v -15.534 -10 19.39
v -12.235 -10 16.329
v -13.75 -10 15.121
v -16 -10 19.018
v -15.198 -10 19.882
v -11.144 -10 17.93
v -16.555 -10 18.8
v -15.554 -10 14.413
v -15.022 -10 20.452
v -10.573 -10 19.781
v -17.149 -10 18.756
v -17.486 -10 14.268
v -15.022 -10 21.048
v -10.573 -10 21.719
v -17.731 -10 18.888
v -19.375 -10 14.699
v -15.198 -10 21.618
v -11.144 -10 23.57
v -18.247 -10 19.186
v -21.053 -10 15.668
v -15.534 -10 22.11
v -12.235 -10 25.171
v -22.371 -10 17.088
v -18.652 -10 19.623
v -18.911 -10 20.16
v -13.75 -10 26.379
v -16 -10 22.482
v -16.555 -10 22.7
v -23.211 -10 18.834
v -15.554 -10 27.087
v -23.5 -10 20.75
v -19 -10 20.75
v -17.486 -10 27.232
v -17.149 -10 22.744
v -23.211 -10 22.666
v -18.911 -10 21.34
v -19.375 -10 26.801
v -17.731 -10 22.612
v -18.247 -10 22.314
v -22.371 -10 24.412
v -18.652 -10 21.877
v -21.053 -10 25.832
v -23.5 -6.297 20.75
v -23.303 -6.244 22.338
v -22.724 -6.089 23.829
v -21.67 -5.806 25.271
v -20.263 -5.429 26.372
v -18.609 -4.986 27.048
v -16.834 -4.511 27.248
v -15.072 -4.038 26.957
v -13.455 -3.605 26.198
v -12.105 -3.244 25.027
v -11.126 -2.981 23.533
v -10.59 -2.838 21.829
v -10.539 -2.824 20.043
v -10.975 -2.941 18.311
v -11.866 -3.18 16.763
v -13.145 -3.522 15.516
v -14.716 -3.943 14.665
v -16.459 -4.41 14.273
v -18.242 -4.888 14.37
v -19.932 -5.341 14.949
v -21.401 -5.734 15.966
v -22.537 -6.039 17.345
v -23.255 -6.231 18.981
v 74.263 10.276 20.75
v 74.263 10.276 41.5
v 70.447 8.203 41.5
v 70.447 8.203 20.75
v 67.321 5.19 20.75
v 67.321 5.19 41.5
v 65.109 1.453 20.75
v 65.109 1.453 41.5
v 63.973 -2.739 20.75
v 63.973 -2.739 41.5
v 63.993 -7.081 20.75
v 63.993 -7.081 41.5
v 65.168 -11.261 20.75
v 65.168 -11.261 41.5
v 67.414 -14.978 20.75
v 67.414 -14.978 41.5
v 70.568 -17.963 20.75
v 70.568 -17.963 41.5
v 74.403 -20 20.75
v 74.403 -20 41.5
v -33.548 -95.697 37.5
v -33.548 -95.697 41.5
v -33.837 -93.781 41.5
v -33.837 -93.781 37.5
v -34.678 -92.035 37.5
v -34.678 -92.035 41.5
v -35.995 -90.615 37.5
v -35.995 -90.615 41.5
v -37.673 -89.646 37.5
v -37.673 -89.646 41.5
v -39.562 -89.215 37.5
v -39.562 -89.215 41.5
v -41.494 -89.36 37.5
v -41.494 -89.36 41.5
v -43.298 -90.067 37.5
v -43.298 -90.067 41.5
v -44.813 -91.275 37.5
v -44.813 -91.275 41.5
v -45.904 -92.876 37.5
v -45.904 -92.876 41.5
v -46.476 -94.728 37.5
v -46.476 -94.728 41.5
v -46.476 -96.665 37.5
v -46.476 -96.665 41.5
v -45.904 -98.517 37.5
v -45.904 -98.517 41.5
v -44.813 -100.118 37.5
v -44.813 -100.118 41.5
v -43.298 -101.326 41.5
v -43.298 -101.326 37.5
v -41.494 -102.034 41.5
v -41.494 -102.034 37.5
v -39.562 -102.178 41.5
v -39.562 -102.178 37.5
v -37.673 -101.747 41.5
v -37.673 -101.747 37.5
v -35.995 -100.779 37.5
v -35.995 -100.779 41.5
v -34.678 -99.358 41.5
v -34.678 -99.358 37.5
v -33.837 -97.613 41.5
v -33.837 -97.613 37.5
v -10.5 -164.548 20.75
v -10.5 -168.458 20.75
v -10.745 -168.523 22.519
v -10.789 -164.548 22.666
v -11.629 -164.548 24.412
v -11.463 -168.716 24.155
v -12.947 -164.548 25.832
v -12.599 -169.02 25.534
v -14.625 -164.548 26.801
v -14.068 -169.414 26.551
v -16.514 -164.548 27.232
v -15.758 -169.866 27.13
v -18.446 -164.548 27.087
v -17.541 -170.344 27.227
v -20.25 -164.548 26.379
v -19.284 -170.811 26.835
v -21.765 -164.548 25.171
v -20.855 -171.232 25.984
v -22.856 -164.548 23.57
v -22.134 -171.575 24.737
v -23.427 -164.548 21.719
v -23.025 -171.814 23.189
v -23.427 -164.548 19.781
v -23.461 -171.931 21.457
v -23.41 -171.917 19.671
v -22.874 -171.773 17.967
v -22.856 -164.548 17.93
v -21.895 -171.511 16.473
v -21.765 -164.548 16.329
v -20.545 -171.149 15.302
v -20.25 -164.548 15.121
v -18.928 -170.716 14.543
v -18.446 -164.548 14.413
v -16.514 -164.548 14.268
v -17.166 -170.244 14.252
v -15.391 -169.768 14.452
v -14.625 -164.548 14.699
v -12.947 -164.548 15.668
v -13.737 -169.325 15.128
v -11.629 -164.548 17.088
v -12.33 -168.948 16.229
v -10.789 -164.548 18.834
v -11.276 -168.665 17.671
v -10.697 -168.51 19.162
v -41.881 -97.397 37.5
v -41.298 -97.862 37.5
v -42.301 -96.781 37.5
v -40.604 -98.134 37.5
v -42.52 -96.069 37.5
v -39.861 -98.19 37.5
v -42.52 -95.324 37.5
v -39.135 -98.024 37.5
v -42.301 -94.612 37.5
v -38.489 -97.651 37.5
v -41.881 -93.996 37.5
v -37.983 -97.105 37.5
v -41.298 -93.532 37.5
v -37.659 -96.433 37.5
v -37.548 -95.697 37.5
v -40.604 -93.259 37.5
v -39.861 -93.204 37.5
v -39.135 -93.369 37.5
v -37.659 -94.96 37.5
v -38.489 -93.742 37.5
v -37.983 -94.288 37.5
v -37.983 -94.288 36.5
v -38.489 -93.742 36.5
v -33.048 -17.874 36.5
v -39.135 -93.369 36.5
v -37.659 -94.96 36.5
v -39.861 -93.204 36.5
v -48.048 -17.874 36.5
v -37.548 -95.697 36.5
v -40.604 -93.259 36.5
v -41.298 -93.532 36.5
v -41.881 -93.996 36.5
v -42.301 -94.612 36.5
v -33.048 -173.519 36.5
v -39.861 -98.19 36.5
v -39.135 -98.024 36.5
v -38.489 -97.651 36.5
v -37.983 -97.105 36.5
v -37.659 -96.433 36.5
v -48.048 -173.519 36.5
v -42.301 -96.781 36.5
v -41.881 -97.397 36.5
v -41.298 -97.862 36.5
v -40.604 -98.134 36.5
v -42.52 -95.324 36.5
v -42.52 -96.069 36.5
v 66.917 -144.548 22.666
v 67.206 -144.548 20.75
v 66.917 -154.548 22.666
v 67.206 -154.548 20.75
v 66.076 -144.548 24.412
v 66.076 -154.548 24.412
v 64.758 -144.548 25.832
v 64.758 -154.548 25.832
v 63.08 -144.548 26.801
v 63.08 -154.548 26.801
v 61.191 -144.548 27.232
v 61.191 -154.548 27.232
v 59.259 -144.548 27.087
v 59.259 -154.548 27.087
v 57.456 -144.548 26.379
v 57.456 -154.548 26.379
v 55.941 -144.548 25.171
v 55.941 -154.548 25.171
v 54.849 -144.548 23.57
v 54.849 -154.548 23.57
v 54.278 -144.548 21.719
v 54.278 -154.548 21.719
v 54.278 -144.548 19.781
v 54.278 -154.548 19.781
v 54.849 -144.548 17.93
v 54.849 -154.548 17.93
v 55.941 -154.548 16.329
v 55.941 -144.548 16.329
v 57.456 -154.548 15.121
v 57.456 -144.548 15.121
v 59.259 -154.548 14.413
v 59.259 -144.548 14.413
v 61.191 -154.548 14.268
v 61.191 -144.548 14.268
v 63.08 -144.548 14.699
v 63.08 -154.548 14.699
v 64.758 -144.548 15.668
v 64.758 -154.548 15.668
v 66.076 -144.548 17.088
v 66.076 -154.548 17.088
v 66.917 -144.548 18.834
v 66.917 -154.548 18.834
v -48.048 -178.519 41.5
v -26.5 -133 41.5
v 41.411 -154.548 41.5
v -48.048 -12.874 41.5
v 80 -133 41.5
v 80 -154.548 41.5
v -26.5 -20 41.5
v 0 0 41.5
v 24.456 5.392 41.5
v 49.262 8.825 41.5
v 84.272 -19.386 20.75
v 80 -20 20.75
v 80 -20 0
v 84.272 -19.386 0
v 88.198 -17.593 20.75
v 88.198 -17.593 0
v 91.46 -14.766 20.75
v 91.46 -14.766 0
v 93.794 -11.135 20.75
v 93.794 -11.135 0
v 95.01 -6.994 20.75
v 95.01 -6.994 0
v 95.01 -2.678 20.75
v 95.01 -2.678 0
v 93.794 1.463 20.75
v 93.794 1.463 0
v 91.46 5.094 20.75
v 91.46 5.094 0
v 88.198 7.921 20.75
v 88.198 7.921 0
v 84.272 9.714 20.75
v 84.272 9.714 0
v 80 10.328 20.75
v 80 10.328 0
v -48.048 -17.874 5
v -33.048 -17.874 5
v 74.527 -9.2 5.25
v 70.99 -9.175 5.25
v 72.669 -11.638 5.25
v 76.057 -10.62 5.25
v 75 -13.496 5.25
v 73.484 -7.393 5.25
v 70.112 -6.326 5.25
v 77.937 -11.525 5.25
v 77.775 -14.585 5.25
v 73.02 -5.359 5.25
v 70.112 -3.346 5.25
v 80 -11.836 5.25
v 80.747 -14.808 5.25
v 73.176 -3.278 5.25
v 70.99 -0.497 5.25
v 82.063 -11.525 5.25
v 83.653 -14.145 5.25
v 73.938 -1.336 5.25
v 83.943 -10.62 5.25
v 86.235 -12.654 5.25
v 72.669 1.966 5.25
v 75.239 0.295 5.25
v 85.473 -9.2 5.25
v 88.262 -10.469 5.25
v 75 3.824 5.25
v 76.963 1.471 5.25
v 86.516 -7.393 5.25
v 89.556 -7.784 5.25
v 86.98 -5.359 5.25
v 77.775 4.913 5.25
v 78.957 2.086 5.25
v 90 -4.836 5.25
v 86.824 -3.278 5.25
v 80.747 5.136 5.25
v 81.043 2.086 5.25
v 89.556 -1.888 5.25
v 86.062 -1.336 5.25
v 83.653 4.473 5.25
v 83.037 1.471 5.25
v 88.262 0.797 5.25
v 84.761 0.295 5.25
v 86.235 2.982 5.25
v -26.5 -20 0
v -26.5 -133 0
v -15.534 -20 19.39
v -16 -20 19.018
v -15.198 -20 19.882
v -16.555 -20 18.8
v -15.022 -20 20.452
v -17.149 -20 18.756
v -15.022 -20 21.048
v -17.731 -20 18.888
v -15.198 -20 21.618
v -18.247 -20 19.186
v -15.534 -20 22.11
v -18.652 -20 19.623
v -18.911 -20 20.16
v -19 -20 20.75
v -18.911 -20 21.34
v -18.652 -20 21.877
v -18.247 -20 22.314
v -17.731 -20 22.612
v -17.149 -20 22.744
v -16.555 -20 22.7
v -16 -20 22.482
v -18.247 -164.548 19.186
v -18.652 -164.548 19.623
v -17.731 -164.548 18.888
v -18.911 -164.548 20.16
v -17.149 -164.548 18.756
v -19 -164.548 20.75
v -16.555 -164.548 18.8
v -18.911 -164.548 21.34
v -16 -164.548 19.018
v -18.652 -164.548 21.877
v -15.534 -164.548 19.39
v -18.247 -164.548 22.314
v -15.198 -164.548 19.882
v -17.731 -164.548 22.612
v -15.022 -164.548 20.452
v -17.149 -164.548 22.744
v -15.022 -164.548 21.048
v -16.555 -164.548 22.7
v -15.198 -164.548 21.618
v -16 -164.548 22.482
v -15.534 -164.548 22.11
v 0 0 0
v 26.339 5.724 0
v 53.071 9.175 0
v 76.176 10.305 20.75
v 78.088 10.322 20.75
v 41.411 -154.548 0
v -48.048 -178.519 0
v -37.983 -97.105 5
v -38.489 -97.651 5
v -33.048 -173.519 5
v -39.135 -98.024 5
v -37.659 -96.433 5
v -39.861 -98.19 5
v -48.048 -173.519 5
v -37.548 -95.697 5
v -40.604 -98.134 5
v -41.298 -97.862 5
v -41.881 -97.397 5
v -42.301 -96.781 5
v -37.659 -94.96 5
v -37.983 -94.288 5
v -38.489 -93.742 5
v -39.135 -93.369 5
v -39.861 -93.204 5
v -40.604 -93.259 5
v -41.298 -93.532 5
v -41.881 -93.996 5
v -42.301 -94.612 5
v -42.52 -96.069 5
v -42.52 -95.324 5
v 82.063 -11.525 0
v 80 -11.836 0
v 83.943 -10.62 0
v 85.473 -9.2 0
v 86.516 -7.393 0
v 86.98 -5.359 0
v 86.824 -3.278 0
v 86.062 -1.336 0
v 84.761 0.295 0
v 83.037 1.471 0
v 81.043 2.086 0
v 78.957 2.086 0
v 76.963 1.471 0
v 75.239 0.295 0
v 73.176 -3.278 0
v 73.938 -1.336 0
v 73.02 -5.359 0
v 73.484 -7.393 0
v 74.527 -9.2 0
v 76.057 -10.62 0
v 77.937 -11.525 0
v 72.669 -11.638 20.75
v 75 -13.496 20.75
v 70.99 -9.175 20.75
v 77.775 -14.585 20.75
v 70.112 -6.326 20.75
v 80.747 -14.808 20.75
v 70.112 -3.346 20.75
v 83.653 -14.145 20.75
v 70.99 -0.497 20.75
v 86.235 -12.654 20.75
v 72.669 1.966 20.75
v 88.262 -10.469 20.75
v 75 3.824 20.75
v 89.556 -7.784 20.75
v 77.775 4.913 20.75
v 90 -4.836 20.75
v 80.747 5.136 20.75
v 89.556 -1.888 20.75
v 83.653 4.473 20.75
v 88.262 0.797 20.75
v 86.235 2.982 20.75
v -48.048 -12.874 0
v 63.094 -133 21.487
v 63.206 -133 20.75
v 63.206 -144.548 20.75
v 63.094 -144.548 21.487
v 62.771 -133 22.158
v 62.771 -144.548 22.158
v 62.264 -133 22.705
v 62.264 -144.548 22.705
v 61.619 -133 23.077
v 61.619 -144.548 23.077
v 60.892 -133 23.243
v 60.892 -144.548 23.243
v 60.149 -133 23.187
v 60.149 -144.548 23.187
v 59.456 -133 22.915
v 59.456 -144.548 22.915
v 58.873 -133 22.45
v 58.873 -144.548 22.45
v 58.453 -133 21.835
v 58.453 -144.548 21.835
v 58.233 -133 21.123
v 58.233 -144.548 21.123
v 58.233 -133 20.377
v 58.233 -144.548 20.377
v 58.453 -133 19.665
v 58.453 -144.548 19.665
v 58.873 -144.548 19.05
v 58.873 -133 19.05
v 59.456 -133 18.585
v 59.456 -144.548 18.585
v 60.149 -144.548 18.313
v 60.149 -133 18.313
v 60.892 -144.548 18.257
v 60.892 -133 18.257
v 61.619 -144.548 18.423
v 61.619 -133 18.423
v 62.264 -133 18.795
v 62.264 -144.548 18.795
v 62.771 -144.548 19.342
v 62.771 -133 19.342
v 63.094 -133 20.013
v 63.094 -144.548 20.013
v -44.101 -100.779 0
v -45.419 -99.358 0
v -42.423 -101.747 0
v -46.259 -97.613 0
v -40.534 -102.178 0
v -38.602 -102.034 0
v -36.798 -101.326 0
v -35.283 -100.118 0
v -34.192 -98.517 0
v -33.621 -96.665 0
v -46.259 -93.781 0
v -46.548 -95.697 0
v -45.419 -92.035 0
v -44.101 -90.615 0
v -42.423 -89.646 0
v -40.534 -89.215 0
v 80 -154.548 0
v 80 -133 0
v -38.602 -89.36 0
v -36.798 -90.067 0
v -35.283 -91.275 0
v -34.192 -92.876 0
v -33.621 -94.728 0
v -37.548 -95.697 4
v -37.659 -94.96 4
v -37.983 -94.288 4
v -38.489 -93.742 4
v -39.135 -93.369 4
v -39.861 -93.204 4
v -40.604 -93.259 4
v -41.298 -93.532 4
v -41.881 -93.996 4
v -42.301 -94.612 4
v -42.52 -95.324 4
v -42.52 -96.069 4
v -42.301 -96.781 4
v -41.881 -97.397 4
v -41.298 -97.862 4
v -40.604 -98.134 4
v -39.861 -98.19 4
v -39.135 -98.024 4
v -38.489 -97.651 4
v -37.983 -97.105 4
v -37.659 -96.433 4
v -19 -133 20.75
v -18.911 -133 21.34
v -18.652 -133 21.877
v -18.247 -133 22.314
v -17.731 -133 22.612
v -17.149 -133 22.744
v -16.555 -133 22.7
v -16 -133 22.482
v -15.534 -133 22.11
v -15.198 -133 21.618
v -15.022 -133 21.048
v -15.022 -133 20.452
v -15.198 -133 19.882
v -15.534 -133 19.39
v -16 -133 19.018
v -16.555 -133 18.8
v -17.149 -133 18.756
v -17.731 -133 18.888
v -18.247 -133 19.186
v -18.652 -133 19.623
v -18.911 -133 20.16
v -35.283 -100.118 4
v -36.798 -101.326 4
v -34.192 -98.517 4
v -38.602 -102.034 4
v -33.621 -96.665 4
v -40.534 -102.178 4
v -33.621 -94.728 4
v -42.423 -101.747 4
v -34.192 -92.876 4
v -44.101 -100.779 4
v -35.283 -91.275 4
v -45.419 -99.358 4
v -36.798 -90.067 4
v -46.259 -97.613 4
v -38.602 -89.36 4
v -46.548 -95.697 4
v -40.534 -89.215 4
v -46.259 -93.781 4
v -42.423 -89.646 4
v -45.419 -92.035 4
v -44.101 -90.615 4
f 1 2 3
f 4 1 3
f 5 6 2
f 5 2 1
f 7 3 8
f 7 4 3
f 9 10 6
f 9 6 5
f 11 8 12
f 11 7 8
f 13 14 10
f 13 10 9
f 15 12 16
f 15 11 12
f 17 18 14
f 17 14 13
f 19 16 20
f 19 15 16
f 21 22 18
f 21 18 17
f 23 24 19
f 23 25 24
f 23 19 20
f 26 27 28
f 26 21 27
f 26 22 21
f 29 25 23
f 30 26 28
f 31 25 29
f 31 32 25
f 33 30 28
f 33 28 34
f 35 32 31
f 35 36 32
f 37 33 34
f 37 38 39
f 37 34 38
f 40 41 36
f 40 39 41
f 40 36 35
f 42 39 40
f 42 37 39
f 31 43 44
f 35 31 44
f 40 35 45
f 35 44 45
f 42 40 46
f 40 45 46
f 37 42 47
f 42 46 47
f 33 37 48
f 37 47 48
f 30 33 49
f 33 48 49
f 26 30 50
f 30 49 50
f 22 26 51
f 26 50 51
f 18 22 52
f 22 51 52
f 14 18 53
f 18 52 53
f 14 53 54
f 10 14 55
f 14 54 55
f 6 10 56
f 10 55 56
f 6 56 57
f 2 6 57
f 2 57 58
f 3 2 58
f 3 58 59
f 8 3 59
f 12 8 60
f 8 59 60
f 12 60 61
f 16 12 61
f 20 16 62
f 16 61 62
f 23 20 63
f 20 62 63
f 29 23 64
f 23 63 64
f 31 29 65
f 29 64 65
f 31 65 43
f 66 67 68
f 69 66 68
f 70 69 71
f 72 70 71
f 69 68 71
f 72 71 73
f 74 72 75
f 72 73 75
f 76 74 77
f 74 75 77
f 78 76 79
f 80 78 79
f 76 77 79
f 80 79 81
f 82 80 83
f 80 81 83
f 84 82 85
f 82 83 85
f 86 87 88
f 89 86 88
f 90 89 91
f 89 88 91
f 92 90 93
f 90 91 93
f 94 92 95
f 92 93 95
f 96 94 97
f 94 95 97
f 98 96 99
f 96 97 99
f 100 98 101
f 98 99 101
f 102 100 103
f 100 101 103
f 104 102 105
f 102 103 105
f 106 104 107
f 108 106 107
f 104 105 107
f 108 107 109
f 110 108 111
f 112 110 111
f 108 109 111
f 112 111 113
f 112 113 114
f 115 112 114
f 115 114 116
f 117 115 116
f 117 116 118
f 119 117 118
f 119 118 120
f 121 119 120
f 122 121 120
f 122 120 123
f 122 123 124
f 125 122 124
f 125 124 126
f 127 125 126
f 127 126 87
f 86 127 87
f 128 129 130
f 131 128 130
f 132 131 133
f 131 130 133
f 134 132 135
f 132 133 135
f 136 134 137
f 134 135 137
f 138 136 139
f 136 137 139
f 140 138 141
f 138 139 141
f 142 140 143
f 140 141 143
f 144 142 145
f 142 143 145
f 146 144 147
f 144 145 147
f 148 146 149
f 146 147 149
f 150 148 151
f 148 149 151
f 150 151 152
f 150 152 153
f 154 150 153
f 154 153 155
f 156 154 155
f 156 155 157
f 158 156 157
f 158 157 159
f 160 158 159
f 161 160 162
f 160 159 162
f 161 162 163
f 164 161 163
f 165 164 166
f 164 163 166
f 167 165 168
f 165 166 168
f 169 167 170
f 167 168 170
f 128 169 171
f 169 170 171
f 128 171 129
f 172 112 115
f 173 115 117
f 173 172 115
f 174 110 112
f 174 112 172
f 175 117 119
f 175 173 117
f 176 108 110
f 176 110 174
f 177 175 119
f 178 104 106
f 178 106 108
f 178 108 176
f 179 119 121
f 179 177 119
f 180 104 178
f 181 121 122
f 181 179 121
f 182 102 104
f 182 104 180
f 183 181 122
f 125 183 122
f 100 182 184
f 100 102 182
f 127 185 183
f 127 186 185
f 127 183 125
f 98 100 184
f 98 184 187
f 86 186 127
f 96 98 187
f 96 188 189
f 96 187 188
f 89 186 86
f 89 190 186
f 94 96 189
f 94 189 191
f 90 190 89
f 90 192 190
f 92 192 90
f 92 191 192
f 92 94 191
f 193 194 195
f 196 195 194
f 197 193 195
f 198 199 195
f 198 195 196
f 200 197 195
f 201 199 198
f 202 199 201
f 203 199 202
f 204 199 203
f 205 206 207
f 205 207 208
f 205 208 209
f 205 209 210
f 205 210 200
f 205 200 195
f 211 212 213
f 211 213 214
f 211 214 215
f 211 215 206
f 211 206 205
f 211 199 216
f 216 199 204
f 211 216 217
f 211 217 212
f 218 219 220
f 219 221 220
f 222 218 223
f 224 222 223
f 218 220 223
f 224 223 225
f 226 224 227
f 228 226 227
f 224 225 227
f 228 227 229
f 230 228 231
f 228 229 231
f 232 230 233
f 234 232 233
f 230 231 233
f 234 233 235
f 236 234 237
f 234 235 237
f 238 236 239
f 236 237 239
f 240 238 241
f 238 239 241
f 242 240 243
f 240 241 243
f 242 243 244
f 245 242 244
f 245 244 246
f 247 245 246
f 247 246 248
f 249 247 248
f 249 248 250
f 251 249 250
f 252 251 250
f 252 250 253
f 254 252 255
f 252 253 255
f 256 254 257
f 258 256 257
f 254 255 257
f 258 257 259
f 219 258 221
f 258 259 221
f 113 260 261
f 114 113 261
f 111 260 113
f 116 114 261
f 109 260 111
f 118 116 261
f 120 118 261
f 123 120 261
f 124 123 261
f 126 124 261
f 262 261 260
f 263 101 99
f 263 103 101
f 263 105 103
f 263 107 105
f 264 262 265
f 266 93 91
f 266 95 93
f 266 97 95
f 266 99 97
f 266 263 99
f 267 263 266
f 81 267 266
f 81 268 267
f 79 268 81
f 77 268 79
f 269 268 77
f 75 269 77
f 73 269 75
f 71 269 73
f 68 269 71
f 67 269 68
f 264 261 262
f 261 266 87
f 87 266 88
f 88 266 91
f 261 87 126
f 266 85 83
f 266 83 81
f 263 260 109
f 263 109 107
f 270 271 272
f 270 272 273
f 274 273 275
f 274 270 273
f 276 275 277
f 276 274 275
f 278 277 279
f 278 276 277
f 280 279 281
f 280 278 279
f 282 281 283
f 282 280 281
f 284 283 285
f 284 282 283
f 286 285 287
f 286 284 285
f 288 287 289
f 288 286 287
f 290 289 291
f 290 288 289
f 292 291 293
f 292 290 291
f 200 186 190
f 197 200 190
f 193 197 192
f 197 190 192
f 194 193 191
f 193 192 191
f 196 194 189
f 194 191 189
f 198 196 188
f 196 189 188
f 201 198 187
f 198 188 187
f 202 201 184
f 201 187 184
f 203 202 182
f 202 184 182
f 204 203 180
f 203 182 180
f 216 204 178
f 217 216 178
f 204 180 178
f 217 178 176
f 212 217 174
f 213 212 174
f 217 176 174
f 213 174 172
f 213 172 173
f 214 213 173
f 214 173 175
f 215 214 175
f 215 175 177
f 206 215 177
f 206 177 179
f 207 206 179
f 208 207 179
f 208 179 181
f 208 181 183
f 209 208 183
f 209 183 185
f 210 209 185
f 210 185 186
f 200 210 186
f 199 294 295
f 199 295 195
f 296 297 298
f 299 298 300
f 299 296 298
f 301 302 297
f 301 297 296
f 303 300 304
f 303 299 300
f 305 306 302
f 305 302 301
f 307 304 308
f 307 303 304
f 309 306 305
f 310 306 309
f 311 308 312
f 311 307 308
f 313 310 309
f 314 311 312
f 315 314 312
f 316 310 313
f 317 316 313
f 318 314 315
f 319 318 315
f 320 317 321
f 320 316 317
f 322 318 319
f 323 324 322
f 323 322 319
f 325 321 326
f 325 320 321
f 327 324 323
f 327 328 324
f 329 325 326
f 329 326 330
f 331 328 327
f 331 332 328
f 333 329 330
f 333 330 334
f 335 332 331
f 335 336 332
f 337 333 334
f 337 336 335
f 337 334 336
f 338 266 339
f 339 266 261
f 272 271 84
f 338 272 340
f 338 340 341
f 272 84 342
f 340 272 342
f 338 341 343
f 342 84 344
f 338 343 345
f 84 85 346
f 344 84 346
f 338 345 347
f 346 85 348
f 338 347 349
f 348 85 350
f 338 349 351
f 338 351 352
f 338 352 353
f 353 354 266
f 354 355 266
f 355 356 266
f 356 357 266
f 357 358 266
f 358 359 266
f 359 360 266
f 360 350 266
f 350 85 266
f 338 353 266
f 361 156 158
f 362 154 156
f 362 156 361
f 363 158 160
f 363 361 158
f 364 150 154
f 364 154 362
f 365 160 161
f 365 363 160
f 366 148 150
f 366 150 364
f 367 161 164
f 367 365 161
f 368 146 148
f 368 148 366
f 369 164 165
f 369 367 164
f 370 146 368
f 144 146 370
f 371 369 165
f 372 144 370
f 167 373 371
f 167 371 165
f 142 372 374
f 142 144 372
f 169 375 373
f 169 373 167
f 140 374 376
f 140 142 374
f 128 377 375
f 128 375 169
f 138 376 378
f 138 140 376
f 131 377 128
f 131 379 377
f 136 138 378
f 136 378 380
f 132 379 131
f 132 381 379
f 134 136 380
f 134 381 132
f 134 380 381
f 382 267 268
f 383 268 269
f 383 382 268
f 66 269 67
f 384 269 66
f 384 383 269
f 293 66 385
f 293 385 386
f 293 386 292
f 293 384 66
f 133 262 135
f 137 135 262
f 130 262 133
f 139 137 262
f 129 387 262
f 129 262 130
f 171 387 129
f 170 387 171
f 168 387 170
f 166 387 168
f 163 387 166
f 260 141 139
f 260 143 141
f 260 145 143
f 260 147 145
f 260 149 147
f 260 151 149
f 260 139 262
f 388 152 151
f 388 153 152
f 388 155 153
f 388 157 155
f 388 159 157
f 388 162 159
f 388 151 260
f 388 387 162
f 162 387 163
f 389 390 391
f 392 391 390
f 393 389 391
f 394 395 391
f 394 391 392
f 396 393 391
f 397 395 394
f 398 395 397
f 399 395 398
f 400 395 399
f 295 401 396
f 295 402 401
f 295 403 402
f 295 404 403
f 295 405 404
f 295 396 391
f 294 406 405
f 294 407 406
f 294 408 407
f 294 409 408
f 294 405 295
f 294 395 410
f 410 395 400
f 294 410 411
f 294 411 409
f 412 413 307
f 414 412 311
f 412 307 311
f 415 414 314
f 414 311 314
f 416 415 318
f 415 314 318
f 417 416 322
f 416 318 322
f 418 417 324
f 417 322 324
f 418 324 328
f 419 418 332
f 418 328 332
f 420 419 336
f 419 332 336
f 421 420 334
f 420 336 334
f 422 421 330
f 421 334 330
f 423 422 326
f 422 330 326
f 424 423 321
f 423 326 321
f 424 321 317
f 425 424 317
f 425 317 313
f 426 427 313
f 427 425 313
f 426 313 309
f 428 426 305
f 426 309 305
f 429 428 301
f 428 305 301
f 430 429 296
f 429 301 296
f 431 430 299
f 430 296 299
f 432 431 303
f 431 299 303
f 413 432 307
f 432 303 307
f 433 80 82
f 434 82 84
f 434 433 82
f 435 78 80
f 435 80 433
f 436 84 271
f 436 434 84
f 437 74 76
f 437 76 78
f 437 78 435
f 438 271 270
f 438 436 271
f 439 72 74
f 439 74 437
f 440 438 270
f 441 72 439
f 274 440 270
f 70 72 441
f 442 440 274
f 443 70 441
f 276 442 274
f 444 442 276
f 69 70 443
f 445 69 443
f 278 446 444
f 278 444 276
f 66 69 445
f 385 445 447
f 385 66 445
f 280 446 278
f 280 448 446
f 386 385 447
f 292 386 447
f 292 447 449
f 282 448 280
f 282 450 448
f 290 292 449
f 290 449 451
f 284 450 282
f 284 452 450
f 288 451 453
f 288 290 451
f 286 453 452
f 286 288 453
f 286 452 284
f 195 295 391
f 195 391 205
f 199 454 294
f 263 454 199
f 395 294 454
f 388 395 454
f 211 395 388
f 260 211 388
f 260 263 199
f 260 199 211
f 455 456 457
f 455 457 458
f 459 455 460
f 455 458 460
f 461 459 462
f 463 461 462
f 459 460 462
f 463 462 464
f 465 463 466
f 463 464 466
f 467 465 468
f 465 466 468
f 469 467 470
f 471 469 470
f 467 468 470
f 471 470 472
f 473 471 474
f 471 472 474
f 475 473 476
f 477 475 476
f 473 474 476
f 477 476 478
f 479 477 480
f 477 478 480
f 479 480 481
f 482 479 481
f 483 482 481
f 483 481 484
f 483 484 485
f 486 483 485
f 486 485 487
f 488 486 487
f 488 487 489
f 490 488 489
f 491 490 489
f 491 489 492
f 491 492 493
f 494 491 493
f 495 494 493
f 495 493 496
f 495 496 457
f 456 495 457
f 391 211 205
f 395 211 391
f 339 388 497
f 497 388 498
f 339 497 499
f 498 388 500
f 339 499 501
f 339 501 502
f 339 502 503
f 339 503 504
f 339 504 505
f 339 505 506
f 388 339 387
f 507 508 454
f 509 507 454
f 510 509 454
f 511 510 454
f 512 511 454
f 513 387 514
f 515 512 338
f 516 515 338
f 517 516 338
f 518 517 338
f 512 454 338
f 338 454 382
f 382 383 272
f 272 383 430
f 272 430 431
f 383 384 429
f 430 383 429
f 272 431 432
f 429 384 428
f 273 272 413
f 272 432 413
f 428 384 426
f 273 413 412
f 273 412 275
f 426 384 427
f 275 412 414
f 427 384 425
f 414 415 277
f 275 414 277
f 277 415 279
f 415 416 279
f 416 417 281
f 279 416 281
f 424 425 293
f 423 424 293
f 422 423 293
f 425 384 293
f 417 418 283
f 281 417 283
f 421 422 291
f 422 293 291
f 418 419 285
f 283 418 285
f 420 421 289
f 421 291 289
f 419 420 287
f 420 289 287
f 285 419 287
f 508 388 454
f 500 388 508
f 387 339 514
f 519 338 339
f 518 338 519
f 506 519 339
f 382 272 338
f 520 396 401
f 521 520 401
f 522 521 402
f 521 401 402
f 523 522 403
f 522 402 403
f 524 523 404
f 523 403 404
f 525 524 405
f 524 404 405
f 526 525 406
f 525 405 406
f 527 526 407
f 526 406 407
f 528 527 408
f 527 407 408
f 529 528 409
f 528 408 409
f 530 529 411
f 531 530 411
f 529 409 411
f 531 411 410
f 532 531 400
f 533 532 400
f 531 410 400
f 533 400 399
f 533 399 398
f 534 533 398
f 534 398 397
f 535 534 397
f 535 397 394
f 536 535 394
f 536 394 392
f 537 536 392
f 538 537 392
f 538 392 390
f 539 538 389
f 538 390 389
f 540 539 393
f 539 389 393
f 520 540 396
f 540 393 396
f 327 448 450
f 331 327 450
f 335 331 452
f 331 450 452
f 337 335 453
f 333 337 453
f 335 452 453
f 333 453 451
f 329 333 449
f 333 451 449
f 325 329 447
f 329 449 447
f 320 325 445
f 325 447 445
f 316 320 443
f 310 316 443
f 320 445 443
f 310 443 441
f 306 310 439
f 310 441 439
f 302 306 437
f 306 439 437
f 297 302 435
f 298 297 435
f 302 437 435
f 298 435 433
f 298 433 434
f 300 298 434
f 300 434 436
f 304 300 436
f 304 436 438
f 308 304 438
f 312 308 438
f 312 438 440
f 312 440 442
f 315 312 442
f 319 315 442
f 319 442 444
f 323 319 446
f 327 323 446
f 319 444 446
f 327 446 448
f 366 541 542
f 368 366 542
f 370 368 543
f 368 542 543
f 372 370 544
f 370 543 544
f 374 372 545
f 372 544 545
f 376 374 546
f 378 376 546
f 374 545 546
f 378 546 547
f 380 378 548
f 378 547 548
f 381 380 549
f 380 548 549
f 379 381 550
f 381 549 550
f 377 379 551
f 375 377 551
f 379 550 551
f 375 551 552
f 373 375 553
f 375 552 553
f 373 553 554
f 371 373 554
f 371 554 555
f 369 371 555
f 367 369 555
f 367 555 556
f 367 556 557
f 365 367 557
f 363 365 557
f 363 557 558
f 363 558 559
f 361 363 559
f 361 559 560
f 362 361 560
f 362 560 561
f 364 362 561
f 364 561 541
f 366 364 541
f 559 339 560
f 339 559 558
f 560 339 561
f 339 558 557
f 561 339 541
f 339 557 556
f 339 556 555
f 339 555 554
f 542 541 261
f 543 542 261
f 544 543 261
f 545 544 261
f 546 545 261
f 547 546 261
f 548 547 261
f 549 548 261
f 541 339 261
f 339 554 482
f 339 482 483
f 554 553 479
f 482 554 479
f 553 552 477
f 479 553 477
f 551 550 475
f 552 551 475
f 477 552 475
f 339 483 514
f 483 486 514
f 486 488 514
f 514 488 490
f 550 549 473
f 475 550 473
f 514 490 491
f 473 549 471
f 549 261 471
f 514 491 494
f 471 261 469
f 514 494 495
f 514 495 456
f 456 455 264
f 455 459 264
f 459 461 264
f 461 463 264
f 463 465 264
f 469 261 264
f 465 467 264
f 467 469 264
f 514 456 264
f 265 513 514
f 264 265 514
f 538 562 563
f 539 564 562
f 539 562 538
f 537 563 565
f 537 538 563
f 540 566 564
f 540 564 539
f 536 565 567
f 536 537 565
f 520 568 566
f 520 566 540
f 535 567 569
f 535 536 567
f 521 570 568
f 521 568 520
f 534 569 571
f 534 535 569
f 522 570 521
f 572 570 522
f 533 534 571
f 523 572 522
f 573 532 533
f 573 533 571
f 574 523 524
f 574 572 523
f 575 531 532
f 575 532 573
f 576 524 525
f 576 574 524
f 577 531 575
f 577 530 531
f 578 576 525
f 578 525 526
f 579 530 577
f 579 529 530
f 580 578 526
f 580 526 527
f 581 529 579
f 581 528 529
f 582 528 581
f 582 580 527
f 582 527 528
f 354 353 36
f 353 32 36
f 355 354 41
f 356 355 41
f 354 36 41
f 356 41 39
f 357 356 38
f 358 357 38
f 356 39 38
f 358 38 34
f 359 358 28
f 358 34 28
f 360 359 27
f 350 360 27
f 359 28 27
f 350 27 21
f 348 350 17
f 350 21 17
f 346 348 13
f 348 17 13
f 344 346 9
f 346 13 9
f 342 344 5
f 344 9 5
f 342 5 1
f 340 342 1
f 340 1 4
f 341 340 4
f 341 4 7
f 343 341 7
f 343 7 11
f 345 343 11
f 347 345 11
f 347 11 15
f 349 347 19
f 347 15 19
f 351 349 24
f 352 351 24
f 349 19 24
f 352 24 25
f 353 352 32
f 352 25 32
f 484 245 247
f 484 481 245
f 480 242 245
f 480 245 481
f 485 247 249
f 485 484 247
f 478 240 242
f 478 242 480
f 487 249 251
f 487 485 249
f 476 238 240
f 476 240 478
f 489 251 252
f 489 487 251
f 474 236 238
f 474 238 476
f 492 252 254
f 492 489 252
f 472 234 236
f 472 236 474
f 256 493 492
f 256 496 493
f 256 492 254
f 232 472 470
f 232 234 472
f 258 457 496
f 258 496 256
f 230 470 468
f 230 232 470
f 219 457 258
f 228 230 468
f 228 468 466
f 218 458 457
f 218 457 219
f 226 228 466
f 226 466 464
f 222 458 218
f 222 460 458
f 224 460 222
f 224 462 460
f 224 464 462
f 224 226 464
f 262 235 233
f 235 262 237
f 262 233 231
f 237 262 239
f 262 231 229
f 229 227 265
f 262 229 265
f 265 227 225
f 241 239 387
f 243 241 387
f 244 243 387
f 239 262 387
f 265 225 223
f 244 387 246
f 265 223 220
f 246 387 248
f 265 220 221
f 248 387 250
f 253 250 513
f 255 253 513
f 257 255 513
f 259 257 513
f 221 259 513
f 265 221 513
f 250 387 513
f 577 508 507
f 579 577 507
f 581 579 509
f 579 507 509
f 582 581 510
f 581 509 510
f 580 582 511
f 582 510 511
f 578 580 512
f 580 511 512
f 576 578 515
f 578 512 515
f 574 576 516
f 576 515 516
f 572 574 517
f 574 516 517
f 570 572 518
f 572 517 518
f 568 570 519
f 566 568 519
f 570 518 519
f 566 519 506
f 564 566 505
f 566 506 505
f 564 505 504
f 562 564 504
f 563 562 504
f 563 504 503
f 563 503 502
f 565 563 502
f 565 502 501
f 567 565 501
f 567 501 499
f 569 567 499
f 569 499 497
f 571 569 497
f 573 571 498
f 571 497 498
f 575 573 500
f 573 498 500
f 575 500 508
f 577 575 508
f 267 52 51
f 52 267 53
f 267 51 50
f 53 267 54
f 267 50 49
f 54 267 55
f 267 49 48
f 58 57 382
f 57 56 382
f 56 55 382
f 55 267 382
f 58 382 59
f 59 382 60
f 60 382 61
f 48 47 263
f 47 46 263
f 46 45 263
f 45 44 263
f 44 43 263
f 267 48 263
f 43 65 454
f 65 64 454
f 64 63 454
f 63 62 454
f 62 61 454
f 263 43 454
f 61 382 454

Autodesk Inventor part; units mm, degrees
ref_plane "YZ Plane" through (0, 0, 0) normal (1, 0, 0) x (0, 1, 0)
ref_plane "XZ Plane" through (0, 0, 0) normal (0, 1, 0) x (-1, 0, 0)
sketch "Sketch1" plane through (0, 0, 0) normal (0, 0, 1) x (1, 0, 0)
  line L0 (0, 0) -> (160, 0) construction
  line L1 (160, 0) -> (118.589, -154.5481) construction
  line L2 (0, 0) -> (41.411, -154.5481) construction
  line L3 (41.411, -154.5481) -> (118.589, -154.5481)
  circle A0 centre (235.8871, -103.156) radius 80 construction
  line L4 (160, 0) -> (256.5926, -25.8819)
  line L5 (118.589, -154.5481) -> (215.1815, -180.43)
  arc A1 (215.1815, -180.43) -> (256.5926, -25.8819) centre (235.8871, -103.156) ccw
  circle A2 centre (-75.8871, -103.156) radius 80 construction
  line L6 (0, 0) -> (-96.5926, -25.8819)
  line L7 (41.411, -154.5481) -> (-55.1815, -180.43)
  arc A3 (-96.5926, -25.8819) -> (-55.1815, -180.43) centre (-75.8871, -103.156) ccw
  arc A4 (160, 0) -> (0, 0) centre (80, -304.672) ccw
  dimension "d0" = 160
  dimension "d1" = 160
  dimension "d2" = 160
  dimension "d3" = 75
  dimension "d4" = 75
  dimension "d5" = 160
  dimension "d6" = 100
  dimension "d7" = 160
  dimension "d9" = 100
  dimension "d56" = 315
extrude "Extrusion1" add sketch "Sketch1" along normal blind 41.5
sketch "Sketch2" plane through (0, 0, 41.5) normal (0, 0, 1) x (1, 0, 0)
  line L0 (-26.5, -133) -> (186.5, -133)
  line L1 (186.5, -133) -> (186.5, -20)
  line L2 (186.5, -20) -> (-26.5, -20)
  line L3 (-26.5, -20) -> (-26.5, -133)
  line L4 (0, 0) -> (-96.5926, -25.8819) projected
  arc A0 (160, 0) -> (0, 0) centre (80, -304.672) ccw projected
  line L5 (0, 0) -> (160, 0)
  point P0 (80, -20)
  point P1 (80, 0)
  dimension "d12" = 213
  dimension "d13" = 113
  dimension "d57" = 20
extrude "Extrusion2" cut sketch "Sketch2" against normal through all contours L3 L2 L1 L0
sketch "Sketch3" plane through (0, 0, 41.5) normal (0, 0, 1) x (1, 0, 0)
  line L0 (186.5, -20) -> (186.5, -133) construction
  line L1 (186.5, -133) -> (-26.5, -133) construction
  line L2 (-26.5, -133) -> (-26.5, -20) construction
  line L3 (-26.5, -20) -> (186.5, -20) construction
  line L4 (0, 0) -> (-96.5926, -25.8819) construction
  arc A0 (-96.5926, -25.8819) -> (-55.1815, -180.43) centre (-75.8871, -103.156) ccw construction
  line L5 (-55.1815, -180.43) -> (41.411, -154.5481) construction
  line L6 (41.411, -154.5481) -> (118.589, -154.5481) construction
  line L7 (118.589, -154.5481) -> (215.1815, -180.43) construction
  arc A1 (215.1815, -180.43) -> (256.5926, -25.8819) centre (235.8871, -103.156) ccw construction
  line L8 (256.5926, -25.8819) -> (160, 0) construction
  line L9 (-48.0481, -154.5481) -> (208.0481, -154.5481) construction
  line L10 (208.0481, -154.5481) -> (208.0481, 10.328) construction
  line L11 (-48.0481, 10.328) -> (-48.0481, -154.5481) construction
  line L12 (-48.0481, 10.328) -> (-48.0481, -178.5186)
  line L13 (-55.1815, -180.43) -> (41.411, -154.5481) projected
  line L14 (208.0481, 10.328) -> (208.0481, -178.5186)
  line L15 (118.589, -154.5481) -> (215.1815, -180.43) projected
  line L16 (-48.0481, -178.5186) -> (208.0481, -178.5186)
  line L17 (-48.0481, 10.328) -> (208.0481, 10.328)
  line L18 (-157.6505, -218.8456) -> (317.6505, -218.8456)
  line L19 (317.6505, -218.8456) -> (317.6505, 50.655)
  line L20 (317.6505, 50.655) -> (-157.6505, 50.655)
  line L21 (-157.6505, 50.655) -> (-157.6505, -218.8456)
  arc A2 (160, 0) -> (0, 0) centre (80, -304.672) ccw projected
  point P0 (80, -154.5481)
  point P1 (80, 10.328)
  point P2 (208.0481, -84.0953)
  point P3 (317.6505, -84.0953)
  point P4 (80, 10.328)
  point P5 (80, -218.8456)
  dimension "d22" = 269.5006
  dimension "d23" = 475.3011
extrude "Extrusion3" cut sketch "Sketch3" against normal through all
sketch "Sketch5" plane through (0, 0, 41.5) normal (0, 0, 1) x (1, 0, 0)
  line L0 (118.589, -154.5481) -> (208.0481, -178.5186) projected
  line L1 (208.0481, -178.5186) -> (80, -178.5186)
  line L2 (80, -178.5186) -> (80, 10.328)
  line L3 (80, 10.328) -> (208.0481, 10.328)
  line L4 (208.0481, 10.328) -> (208.0481, -178.5186)
  arc A0 (160, 0) -> (0, 0) centre (80, -304.672) ccw projected
extrude "Extrusion4" cut sketch "Sketch5" against normal through all
sketch "Sketch6" plane through (0, 0, 0) normal (0, 1, 0) x (-1, 0, 0)
  circle A0 centre (17, 20.75) radius 2
  line L0 (26.5, 41.5) -> (26.5, 0) projected
  point P0 (26.5, 20.75)
  dimension "d24" = 4
  dimension "d58" = 9.5
extrude "Extrusion5" cut sketch "Sketch6" along normal through all both and the other way through all
sketch "Sketch7" plane through (0, 0, 0) normal (0, 1, 0) x (-1, 0, 0)
  circle A0 centre (17, 20.75) radius 2 projected
  circle A1 centre (17, 20.75) radius 6.5
  dimension "d59" = 13
extrude "Extrusion6" cut sketch "Sketch7" against normal blind 10
ref_plane "Work Plane1" through (41.411, -174.5481, 0) normal (0, -1, 0) x (1, 0, 0)
sketch "Sketch8" plane through (41.411, -174.5481, 0) normal (0, -1, 0) x (1, 0, 0)
  circle A0 centre (-58.411, 20.75) radius 2 projected
  circle A1 centre (-58.411, 20.75) radius 6.5
  point P0 (-41.411, 0)
  dimension "d32" = 13
extrude "Extrusion7" cut sketch "Sketch8" against normal blind 10
sketch "Sketch11" plane through (41.411, -154.5481, 0) normal (0, -1, 0) x (1, 0, 0)
  line L0 (0, 41.5) -> (38.589, 41.5) projected
  line L1 (0, 0) -> (0, 41.5) projected
  line L2 (0, 0) -> (38.589, 0) projected
  line L3 (38.589, 0) -> (38.589, 41.5) projected
  circle A0 centre (19.2945, 20.75) radius 2.5
  circle A1 centre (19.2945, 20.75) radius 6.5
  point P0 (-41.411, 0)
  point P1 (0, 20.75)
  point P2 (19.2945, 41.5)
  dimension "d73" = 5
  dimension "d74" = 13
extrude "Extrusion10" cut sketch "Sketch11" against normal blind 10 contours A1
sketch "Sketch12" plane through (-48.0481, -178.5186, 41.5) normal (-1, 0, 0) x (0, 0, 1)
  line L0 (-41.5, 0) -> (-41.5, 165.6442) projected
  line L1 (0, 0) -> (-41.5, 0) projected
  line L2 (0, 165.6442) -> (0, 0) projected
  line L3 (-41.5, 165.6442) -> (0, 165.6442) projected
  line L4 (-5, 5) -> (-36.5, 5)
  line L5 (-36.5, 5) -> (-36.5, 160.6442)
  line L6 (-36.5, 160.6442) -> (-5, 160.6442)
  line L7 (-5, 160.6442) -> (-5, 5)
  point P0 (-41.5, 178.5186)
  dimension "d43" = 5
extrude "Extrusion11" cut sketch "Sketch12" against normal blind 15 contours L4 L5 L6 L7
sketch "Sketch13" plane through (0, 0, 41.5) normal (0, 0, 1) x (1, 0, 0)
  circle A0 centre (-40.0481, -95.6966) radius 2.5
  line L0 (-48.0481, -12.8745) -> (-48.0481, -178.5186) projected
  point P0 (0, 0)
  point P1 (-48.0481, -95.6966)
  dimension "d46" = 5
  dimension "d47" = 8
extrude "Extrusion12" cut sketch "Sketch13" against normal through all
sketch "Sketch14" plane through (0, 0, 41.5) normal (0, 0, 1) x (1, 0, 0)
  circle A0 centre (-40.0481, -95.6966) radius 2.5 projected
  circle A1 centre (-40.0481, -95.6966) radius 6.5
  point P0 (0, 0)
  dimension "d50" = 13
extrude "Extrusion13" cut sketch "Sketch14" against normal blind 4
sketch "Sketch15" plane through (0, 0, 0) normal (0, 0, -1) x (-1, 0, 0)
  circle A0 centre (40.0481, -95.6966) radius 2.5 projected
  circle A1 centre (40.0481, -95.6966) radius 2.5 projected
  circle A2 centre (40.0481, -95.6966) radius 6.5
  point P0 (0, 0)
  dimension "d53" = 13
extrude "Extrusion14" cut sketch "Sketch15" against normal blind 4
sketch "Sketch16" plane through (0, 0, 41.5) normal (0, 0, 1) x (1, 0, 0)
  line L0 (80, -20) -> (80, 10.328) construction
  circle A0 centre (80, -4.836) radius 7 construction
  circle A1 centre (80, -4.836) radius 15.164 construction
  arc A2 (80, -20) -> (80, 10.328) centre (80, -4.836) ccw
  arc A3 (80, -11.836) -> (80, 2.164) centre (80, -4.836) ccw
  arc A4 (80, 10.328) -> (0, 0) centre (80, -304.672) ccw projected
  line L1 (80, 10.328) -> (80, 2.164)
  line L2 (80, -11.836) -> (80, -20)
  dimension "d62" = 14
extrude "Extrusion15" add sketch "Sketch16" against normal blind 41.5
sketch "Sketch17" plane through (0, 0, 41.5) normal (0, 0, 1) x (1, 0, 0)
  arc A0 (80, -11.836) -> (80, 2.164) centre (80, -4.836) ccw construction
  circle A1 centre (80, -4.836) radius 7
  point P0 (0, 0)
extrude "Extrusion16" cut sketch "Sketch17" against normal through all
sketch "Sketch19" plane through (0, 0, 41.5) normal (0, 0, 1) x (1, 0, 0)
  circle A0 centre (80, -4.836) radius 7 projected
  arc A1 (80, -20) -> (80, 10.328) centre (80, -4.836) ccw projected
  circle A2 centre (80, -4.836) radius 15.164 construction
  circle A3 centre (80, -4.836) radius 16.164
  point P0 (0, 0)
  dimension "d72" = 1
extrude "Extrusion18" cut sketch "Sketch19" against normal blind 20.75
sketch "Sketch20" plane through (60.7055, -154.5481, 20.75) normal (0, -1, 0) x (1, 0, 0)
  circle A0 centre (0, 0) radius 2.5 projected
  point P0 (-60.7055, -20.75)
extrude "Extrusion19" cut sketch "Sketch20" against normal blind 50
sketch "Sketch21" plane through (0, 0, 20.75) normal (0, 0, 1) x (1, 0, 0)
  circle A0 centre (80, -4.836) radius 6.5
  circle A1 centre (80, -4.836) radius 10
  point P0 (0, 0)
  dimension "d77" = 20
extrude "Extrusion20" cut sketch "Sketch21" against normal blind 15.5 contours A0 | A1
properties part number "Riser Base" material "ABS Plastic"
